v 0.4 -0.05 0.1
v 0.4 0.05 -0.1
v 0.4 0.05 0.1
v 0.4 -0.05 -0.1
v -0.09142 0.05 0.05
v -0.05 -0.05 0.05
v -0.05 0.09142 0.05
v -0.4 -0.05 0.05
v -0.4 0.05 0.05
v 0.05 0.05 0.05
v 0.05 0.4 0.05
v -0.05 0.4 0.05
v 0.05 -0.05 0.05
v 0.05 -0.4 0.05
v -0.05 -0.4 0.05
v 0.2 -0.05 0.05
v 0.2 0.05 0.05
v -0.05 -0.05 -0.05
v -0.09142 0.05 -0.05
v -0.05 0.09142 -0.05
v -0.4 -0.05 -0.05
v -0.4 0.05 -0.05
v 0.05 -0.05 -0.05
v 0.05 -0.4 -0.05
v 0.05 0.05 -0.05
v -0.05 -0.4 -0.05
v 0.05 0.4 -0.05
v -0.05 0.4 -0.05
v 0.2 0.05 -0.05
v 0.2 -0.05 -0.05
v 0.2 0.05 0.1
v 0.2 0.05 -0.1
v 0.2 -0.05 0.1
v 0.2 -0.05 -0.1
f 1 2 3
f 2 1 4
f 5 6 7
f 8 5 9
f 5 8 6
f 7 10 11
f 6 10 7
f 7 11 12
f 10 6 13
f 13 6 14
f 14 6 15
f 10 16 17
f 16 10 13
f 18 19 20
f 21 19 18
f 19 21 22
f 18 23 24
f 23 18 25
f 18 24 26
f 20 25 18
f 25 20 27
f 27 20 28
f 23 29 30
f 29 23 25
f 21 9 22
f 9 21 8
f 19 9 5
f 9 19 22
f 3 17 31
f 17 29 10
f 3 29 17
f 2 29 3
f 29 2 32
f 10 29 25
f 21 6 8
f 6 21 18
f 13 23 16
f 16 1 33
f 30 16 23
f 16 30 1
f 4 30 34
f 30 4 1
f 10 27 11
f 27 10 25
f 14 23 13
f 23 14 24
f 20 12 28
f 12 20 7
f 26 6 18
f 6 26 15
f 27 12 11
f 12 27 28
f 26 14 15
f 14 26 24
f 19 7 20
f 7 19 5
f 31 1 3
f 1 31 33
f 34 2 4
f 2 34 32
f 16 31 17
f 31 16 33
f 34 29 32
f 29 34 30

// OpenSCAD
module l_bracket() {
    // Dimensions
    arm_length = 0.8;
    arm_width = 0.1;
    arm_thickness = 0.1;
    gusset_size = 0.1;
    thickened_end_length = 0.2;
    thickened_end_thickness = 0.2;

    // Horizontal arm
    translate([-arm_length/2, -arm_width/2, -arm_thickness/2])
        cube([arm_length, arm_width, arm_thickness]);

    // Vertical arm
    translate([-arm_width/2, -arm_length/2, -arm_thickness/2])
        cube([arm_width, arm_length, arm_thickness]);

    // Gusset
    translate([-gusset_size/2, -gusset_size/2, -arm_thickness/2])
        rotate([0, 0, 45])
        cube([gusset_size * sqrt(2), gusset_size, arm_thickness]);

    // Thickened end
    translate([arm_length/2 - thickened_end_length, -arm_width/2, -thickened_end_thickness/2])
        cube([thickened_end_length, arm_width, thickened_end_thickness]);
}

l_bracket();
